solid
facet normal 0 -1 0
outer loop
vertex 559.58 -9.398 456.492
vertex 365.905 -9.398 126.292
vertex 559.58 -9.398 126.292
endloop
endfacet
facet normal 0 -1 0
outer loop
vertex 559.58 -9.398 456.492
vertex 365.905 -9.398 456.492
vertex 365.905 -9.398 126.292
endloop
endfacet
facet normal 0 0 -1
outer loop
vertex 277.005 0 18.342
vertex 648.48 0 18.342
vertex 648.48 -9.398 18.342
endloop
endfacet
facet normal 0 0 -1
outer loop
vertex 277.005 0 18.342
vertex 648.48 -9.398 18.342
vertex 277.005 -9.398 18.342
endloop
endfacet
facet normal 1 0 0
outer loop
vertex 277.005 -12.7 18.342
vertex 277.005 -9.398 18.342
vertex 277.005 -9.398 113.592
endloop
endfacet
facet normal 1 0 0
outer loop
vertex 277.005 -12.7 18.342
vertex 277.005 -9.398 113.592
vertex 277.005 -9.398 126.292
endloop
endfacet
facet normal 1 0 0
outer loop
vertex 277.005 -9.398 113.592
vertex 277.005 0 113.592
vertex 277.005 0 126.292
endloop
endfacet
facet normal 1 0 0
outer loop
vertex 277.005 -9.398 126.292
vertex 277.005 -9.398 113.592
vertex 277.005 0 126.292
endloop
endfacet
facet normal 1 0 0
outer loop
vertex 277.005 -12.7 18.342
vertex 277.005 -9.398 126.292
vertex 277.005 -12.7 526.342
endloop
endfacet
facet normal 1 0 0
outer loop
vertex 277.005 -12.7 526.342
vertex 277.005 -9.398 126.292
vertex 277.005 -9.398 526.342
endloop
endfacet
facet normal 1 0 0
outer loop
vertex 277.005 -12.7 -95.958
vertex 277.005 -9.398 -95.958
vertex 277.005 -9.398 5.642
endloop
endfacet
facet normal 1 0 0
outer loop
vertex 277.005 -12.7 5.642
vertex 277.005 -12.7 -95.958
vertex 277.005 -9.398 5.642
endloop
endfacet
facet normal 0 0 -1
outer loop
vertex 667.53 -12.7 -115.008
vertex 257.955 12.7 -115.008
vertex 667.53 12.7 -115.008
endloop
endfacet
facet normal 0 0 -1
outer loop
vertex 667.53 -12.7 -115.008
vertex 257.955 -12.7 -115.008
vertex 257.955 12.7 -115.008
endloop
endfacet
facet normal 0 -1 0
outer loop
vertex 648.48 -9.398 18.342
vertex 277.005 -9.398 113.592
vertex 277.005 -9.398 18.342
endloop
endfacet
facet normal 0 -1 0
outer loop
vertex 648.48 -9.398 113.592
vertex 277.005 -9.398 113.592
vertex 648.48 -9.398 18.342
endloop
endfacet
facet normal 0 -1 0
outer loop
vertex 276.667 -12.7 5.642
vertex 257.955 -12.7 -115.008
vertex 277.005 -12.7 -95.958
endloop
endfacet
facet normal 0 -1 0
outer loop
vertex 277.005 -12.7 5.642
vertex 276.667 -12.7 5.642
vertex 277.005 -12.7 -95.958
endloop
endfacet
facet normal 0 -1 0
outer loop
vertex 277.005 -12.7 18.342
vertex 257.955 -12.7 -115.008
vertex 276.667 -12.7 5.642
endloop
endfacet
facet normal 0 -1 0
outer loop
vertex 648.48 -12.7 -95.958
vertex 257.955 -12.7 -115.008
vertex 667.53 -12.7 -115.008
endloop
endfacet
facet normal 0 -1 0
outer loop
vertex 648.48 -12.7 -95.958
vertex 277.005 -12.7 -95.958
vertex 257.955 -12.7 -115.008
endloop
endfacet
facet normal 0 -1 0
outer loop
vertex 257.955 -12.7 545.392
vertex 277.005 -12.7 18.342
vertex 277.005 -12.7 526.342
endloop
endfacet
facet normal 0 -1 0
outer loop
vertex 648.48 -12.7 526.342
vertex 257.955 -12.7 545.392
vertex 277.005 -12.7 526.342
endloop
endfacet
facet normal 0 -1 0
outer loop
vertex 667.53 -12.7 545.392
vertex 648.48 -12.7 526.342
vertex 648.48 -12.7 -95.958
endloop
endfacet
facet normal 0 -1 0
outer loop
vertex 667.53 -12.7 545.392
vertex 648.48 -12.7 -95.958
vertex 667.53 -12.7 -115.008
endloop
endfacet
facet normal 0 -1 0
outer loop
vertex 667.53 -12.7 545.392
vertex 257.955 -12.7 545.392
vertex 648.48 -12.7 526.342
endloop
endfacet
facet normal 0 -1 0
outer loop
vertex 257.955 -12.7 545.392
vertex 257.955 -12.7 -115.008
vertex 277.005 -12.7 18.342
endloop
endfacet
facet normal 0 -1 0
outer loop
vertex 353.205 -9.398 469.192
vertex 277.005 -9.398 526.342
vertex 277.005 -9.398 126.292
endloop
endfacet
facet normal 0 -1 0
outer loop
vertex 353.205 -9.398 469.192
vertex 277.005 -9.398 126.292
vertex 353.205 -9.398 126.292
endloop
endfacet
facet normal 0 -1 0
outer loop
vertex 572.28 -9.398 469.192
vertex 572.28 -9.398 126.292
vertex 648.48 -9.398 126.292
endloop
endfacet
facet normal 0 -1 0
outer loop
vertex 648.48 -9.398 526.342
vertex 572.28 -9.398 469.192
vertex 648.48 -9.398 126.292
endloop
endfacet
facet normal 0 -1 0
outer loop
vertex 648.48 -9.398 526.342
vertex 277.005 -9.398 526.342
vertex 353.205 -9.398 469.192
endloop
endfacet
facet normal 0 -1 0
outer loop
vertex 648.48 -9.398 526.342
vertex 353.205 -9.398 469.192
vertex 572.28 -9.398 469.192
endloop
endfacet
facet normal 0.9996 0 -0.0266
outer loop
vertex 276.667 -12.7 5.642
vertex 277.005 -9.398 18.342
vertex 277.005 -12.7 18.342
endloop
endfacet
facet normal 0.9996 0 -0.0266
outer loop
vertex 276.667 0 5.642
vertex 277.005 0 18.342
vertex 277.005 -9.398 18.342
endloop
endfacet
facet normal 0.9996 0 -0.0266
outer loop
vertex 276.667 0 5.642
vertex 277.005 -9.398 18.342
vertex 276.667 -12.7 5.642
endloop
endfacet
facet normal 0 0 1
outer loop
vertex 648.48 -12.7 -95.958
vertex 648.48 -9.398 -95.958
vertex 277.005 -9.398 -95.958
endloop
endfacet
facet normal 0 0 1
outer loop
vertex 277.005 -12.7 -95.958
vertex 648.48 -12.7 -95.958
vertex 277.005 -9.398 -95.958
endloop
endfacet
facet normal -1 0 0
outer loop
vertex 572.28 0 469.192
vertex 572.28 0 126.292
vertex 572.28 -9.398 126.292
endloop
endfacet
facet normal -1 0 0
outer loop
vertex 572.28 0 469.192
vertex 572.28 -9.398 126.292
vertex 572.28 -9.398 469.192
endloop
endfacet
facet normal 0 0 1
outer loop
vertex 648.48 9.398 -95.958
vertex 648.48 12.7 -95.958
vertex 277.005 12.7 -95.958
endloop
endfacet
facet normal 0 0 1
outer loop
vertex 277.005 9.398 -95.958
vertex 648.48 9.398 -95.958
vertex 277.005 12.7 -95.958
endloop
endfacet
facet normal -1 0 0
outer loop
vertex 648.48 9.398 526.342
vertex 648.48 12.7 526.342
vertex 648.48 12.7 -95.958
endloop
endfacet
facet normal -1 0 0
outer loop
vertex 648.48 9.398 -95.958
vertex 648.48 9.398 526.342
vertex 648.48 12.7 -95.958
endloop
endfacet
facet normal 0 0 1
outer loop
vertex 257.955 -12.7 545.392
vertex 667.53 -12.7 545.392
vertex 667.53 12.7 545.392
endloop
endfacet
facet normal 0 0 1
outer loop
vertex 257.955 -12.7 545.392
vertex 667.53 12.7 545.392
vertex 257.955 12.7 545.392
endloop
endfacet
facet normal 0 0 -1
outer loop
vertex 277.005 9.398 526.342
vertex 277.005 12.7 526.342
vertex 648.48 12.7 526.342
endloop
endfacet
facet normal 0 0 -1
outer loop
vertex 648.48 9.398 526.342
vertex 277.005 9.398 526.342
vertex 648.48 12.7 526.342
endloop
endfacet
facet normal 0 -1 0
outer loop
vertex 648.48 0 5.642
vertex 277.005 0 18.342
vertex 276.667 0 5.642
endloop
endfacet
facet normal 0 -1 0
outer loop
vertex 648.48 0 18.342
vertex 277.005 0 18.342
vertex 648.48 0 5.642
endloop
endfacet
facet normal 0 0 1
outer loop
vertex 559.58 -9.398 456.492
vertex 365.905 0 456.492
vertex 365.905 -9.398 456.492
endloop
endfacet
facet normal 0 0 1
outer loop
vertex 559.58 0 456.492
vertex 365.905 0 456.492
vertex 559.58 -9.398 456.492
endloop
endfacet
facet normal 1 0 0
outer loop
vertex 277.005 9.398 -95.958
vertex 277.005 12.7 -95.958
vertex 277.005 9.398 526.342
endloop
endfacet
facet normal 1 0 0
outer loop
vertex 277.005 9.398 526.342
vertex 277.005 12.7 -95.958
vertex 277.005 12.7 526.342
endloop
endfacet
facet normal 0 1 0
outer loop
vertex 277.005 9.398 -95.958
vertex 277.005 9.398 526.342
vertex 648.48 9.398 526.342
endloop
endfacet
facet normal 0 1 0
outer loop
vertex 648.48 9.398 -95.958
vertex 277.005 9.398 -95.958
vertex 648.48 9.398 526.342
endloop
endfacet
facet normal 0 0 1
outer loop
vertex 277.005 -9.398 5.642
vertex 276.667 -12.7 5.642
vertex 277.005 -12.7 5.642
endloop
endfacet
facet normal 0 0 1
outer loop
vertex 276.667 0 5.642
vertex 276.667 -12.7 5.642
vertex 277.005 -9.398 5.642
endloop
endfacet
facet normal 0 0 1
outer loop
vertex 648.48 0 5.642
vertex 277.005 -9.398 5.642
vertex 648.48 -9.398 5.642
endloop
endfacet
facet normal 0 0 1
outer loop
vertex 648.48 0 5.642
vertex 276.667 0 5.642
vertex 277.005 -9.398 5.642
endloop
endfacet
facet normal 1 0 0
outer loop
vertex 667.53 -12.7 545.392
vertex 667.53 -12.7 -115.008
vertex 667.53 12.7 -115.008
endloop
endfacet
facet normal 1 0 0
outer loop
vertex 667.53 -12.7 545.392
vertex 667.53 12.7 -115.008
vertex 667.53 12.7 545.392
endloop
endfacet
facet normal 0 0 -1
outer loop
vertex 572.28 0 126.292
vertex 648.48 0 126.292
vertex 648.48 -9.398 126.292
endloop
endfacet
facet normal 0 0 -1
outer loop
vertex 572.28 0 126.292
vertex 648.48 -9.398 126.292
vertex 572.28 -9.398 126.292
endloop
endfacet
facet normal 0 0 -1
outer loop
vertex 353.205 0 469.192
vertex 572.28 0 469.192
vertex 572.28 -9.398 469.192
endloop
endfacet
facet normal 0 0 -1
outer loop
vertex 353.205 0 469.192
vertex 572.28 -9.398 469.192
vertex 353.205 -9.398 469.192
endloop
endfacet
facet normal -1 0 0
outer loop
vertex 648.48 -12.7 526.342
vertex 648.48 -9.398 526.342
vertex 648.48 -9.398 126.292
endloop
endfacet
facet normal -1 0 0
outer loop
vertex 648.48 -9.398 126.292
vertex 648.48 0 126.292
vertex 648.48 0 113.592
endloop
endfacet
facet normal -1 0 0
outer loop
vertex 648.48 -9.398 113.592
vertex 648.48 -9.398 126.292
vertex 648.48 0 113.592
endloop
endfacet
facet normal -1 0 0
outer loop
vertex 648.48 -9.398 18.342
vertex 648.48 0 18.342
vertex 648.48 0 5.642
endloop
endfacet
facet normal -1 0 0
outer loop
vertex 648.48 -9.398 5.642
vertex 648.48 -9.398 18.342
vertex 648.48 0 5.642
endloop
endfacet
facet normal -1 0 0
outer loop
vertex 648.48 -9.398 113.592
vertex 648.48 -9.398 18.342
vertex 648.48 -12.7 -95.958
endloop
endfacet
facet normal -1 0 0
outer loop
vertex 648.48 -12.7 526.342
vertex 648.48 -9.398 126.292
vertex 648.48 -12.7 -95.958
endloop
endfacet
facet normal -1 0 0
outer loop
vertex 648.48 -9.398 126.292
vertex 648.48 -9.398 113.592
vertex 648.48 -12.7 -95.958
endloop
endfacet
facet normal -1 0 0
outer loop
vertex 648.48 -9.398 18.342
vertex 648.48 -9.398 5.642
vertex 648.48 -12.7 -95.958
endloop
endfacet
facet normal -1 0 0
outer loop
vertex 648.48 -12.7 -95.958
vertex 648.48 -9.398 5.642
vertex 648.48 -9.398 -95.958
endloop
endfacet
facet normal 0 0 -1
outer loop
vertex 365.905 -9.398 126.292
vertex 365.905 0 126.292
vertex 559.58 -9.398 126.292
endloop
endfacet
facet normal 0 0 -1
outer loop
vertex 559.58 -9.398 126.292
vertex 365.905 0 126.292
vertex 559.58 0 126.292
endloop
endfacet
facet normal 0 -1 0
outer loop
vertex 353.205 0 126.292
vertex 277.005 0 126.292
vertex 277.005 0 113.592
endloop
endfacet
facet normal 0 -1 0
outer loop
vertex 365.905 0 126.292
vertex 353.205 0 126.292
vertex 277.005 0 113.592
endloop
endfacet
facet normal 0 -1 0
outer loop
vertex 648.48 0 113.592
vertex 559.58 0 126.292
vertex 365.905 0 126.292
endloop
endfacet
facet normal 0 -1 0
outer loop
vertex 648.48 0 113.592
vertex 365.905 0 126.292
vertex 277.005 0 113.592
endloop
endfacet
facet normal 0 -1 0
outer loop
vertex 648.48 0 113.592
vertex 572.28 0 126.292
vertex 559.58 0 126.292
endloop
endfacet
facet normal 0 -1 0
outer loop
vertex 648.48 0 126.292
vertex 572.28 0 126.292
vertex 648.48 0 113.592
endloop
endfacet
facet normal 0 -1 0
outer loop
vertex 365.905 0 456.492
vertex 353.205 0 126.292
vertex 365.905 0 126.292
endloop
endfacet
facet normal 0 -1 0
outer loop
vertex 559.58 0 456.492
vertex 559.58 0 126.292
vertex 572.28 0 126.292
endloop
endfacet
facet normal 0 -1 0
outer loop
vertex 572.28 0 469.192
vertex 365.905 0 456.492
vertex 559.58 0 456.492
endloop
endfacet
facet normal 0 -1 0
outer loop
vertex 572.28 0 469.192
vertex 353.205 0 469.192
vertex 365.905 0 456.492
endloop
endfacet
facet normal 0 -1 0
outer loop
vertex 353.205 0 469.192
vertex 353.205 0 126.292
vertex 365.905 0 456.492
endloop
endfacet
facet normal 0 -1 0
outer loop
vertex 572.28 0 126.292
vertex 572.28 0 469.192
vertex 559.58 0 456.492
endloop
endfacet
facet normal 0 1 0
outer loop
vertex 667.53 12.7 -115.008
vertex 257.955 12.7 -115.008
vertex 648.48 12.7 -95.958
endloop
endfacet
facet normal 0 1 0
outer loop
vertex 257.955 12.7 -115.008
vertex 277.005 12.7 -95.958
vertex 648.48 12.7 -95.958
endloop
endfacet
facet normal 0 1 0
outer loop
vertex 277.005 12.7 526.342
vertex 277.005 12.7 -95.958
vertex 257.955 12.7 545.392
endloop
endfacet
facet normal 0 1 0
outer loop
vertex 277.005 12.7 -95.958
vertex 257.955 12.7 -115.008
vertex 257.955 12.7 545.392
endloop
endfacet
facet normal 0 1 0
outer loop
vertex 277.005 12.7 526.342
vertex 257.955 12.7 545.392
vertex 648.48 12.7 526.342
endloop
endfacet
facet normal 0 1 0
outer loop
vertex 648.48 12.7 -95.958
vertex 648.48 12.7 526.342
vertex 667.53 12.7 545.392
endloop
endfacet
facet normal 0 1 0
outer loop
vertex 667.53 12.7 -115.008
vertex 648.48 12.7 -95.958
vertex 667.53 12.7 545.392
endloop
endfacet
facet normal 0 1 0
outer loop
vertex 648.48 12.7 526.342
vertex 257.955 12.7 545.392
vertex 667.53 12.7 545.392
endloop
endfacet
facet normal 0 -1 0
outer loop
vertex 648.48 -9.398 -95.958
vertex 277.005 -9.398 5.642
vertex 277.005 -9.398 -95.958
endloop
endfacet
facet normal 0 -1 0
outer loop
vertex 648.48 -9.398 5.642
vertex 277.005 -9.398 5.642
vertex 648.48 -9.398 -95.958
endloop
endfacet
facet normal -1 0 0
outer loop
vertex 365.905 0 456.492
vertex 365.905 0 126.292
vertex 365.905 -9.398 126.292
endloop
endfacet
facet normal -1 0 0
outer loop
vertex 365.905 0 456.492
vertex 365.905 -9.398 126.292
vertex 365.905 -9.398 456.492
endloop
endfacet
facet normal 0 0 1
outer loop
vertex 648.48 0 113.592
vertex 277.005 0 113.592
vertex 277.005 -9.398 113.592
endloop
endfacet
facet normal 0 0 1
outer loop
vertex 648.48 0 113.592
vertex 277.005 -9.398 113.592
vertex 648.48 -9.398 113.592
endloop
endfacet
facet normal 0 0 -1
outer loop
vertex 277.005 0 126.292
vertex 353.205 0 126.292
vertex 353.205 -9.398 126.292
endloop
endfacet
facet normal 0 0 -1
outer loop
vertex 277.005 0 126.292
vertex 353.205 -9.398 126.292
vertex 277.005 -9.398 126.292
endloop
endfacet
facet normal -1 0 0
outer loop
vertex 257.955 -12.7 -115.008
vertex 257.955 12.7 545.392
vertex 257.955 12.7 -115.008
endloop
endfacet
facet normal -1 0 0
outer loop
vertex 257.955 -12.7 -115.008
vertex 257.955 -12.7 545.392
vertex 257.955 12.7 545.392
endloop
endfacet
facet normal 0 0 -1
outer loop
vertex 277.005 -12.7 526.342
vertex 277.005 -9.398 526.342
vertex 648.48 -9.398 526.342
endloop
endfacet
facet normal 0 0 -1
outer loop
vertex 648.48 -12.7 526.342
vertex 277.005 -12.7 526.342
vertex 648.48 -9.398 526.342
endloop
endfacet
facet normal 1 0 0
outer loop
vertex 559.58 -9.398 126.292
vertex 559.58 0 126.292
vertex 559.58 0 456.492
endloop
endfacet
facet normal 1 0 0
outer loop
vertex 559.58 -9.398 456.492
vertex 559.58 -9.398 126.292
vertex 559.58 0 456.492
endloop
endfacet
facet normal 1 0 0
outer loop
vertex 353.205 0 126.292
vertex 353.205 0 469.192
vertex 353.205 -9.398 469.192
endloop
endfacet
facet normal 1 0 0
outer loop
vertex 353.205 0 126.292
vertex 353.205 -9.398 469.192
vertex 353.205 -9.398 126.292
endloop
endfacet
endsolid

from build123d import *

# Parameters (mm, degrees)
F1_DEPTH      = 12.7
F1_DEPTH_BACK = 12.7
F0_W          = 371.475
F0_H          = 622.3
F2_DEPTH      = 9.398
F2_DEPTH_BACK = 9.398
F3_W          = 193.675
F3_H          = 330.2
F4_DEPTH      = 12.7


# Not quite as in the source:
# - a feature names something its author has since deleted; it is built from what else it names


with BuildPart() as f1:
    # F0 (on Front) → F1 (new body, two sides)
    with BuildSketch(Plane.XZ) as f1_sk:
        Polygon((277.0045676708, 526.3417813361), (648.4795676708, 526.3417813361), (667.5295676708, 545.3917813361), (257.9545676708, 545.3917813361), align=None)
        Polygon((277.0045676708, -95.9582186639), (277.0045676708, 526.3417813361), (257.9545676708, 545.3917813361), (257.9545676708, -115.0082186639), align=None)
        Polygon((667.5295676708, 545.3917813361), (648.4795676708, 526.3417813361), (648.4795676708, -95.9582186639), (667.5295676708, -115.0082186639), align=None)
        Polygon((667.5295676708, -115.0082186639), (648.4795676708, -95.9582186639), (277.0045676708, -95.9582186639), (257.9545676708, -115.0082186639), align=None)
    extrude(amount=-F1_DEPTH)
    extrude(f1_sk.sketch, amount=F1_DEPTH_BACK)

    # F0 (on Front) → F2 (join, two sides)
    with BuildSketch(Plane.XZ) as f2_sk:
        Polygon((667.5295676708, 545.3917813361), (648.4795676708, 526.3417813361), (648.4795676708, -95.9582186639), (667.5295676708, -115.0082186639), align=None)
        Polygon((277.0045676708, 526.3417813361), (648.4795676708, 526.3417813361), (667.5295676708, 545.3917813361), (257.9545676708, 545.3917813361), align=None)
        Polygon((667.5295676708, -115.0082186639), (648.4795676708, -95.9582186639), (277.0045676708, -95.9582186639), (257.9545676708, -115.0082186639), align=None)
        Polygon((277.0045676708, -95.9582186639), (277.0045676708, 526.3417813361), (257.9545676708, 545.3917813361), (257.9545676708, -115.0082186639), align=None)
        with Locations((462.7420676708, 215.1917813361)):
            Rectangle(F0_W, F0_H)
    extrude(amount=F2_DEPTH)
    extrude(f2_sk.sketch, amount=-F2_DEPTH_BACK)

    # F3 (on face) → F4 (cut)
    with BuildSketch(Plane.XZ):
        Polygon((276.66666205, 5.6417813361), (648.4795676708, 5.6417813361), (648.4795676708, 18.3417813361), (277.0045676708, 18.3417813361), align=None)
        Polygon((572.2795676708, 456.4917813361), (572.2795676708, 469.1917813361), (353.2045676708, 469.1917813361), (353.2045676708, 456.4917813361), (353.2045676708, 126.2917813361), (277.0045676708, 126.2917813361), (277.0045676708, 113.5917813361), (648.4795676708, 113.5917813361), (648.4795676708, 126.2917813361), (572.2795676708, 126.2917813361), align=None)
        with Locations((462.7420676708, 291.3917813361)):
            Rectangle(F3_W, F3_H, mode=Mode.SUBTRACT)
    extrude(amount=F4_DEPTH, mode=Mode.SUBTRACT)


solid = f1.part
